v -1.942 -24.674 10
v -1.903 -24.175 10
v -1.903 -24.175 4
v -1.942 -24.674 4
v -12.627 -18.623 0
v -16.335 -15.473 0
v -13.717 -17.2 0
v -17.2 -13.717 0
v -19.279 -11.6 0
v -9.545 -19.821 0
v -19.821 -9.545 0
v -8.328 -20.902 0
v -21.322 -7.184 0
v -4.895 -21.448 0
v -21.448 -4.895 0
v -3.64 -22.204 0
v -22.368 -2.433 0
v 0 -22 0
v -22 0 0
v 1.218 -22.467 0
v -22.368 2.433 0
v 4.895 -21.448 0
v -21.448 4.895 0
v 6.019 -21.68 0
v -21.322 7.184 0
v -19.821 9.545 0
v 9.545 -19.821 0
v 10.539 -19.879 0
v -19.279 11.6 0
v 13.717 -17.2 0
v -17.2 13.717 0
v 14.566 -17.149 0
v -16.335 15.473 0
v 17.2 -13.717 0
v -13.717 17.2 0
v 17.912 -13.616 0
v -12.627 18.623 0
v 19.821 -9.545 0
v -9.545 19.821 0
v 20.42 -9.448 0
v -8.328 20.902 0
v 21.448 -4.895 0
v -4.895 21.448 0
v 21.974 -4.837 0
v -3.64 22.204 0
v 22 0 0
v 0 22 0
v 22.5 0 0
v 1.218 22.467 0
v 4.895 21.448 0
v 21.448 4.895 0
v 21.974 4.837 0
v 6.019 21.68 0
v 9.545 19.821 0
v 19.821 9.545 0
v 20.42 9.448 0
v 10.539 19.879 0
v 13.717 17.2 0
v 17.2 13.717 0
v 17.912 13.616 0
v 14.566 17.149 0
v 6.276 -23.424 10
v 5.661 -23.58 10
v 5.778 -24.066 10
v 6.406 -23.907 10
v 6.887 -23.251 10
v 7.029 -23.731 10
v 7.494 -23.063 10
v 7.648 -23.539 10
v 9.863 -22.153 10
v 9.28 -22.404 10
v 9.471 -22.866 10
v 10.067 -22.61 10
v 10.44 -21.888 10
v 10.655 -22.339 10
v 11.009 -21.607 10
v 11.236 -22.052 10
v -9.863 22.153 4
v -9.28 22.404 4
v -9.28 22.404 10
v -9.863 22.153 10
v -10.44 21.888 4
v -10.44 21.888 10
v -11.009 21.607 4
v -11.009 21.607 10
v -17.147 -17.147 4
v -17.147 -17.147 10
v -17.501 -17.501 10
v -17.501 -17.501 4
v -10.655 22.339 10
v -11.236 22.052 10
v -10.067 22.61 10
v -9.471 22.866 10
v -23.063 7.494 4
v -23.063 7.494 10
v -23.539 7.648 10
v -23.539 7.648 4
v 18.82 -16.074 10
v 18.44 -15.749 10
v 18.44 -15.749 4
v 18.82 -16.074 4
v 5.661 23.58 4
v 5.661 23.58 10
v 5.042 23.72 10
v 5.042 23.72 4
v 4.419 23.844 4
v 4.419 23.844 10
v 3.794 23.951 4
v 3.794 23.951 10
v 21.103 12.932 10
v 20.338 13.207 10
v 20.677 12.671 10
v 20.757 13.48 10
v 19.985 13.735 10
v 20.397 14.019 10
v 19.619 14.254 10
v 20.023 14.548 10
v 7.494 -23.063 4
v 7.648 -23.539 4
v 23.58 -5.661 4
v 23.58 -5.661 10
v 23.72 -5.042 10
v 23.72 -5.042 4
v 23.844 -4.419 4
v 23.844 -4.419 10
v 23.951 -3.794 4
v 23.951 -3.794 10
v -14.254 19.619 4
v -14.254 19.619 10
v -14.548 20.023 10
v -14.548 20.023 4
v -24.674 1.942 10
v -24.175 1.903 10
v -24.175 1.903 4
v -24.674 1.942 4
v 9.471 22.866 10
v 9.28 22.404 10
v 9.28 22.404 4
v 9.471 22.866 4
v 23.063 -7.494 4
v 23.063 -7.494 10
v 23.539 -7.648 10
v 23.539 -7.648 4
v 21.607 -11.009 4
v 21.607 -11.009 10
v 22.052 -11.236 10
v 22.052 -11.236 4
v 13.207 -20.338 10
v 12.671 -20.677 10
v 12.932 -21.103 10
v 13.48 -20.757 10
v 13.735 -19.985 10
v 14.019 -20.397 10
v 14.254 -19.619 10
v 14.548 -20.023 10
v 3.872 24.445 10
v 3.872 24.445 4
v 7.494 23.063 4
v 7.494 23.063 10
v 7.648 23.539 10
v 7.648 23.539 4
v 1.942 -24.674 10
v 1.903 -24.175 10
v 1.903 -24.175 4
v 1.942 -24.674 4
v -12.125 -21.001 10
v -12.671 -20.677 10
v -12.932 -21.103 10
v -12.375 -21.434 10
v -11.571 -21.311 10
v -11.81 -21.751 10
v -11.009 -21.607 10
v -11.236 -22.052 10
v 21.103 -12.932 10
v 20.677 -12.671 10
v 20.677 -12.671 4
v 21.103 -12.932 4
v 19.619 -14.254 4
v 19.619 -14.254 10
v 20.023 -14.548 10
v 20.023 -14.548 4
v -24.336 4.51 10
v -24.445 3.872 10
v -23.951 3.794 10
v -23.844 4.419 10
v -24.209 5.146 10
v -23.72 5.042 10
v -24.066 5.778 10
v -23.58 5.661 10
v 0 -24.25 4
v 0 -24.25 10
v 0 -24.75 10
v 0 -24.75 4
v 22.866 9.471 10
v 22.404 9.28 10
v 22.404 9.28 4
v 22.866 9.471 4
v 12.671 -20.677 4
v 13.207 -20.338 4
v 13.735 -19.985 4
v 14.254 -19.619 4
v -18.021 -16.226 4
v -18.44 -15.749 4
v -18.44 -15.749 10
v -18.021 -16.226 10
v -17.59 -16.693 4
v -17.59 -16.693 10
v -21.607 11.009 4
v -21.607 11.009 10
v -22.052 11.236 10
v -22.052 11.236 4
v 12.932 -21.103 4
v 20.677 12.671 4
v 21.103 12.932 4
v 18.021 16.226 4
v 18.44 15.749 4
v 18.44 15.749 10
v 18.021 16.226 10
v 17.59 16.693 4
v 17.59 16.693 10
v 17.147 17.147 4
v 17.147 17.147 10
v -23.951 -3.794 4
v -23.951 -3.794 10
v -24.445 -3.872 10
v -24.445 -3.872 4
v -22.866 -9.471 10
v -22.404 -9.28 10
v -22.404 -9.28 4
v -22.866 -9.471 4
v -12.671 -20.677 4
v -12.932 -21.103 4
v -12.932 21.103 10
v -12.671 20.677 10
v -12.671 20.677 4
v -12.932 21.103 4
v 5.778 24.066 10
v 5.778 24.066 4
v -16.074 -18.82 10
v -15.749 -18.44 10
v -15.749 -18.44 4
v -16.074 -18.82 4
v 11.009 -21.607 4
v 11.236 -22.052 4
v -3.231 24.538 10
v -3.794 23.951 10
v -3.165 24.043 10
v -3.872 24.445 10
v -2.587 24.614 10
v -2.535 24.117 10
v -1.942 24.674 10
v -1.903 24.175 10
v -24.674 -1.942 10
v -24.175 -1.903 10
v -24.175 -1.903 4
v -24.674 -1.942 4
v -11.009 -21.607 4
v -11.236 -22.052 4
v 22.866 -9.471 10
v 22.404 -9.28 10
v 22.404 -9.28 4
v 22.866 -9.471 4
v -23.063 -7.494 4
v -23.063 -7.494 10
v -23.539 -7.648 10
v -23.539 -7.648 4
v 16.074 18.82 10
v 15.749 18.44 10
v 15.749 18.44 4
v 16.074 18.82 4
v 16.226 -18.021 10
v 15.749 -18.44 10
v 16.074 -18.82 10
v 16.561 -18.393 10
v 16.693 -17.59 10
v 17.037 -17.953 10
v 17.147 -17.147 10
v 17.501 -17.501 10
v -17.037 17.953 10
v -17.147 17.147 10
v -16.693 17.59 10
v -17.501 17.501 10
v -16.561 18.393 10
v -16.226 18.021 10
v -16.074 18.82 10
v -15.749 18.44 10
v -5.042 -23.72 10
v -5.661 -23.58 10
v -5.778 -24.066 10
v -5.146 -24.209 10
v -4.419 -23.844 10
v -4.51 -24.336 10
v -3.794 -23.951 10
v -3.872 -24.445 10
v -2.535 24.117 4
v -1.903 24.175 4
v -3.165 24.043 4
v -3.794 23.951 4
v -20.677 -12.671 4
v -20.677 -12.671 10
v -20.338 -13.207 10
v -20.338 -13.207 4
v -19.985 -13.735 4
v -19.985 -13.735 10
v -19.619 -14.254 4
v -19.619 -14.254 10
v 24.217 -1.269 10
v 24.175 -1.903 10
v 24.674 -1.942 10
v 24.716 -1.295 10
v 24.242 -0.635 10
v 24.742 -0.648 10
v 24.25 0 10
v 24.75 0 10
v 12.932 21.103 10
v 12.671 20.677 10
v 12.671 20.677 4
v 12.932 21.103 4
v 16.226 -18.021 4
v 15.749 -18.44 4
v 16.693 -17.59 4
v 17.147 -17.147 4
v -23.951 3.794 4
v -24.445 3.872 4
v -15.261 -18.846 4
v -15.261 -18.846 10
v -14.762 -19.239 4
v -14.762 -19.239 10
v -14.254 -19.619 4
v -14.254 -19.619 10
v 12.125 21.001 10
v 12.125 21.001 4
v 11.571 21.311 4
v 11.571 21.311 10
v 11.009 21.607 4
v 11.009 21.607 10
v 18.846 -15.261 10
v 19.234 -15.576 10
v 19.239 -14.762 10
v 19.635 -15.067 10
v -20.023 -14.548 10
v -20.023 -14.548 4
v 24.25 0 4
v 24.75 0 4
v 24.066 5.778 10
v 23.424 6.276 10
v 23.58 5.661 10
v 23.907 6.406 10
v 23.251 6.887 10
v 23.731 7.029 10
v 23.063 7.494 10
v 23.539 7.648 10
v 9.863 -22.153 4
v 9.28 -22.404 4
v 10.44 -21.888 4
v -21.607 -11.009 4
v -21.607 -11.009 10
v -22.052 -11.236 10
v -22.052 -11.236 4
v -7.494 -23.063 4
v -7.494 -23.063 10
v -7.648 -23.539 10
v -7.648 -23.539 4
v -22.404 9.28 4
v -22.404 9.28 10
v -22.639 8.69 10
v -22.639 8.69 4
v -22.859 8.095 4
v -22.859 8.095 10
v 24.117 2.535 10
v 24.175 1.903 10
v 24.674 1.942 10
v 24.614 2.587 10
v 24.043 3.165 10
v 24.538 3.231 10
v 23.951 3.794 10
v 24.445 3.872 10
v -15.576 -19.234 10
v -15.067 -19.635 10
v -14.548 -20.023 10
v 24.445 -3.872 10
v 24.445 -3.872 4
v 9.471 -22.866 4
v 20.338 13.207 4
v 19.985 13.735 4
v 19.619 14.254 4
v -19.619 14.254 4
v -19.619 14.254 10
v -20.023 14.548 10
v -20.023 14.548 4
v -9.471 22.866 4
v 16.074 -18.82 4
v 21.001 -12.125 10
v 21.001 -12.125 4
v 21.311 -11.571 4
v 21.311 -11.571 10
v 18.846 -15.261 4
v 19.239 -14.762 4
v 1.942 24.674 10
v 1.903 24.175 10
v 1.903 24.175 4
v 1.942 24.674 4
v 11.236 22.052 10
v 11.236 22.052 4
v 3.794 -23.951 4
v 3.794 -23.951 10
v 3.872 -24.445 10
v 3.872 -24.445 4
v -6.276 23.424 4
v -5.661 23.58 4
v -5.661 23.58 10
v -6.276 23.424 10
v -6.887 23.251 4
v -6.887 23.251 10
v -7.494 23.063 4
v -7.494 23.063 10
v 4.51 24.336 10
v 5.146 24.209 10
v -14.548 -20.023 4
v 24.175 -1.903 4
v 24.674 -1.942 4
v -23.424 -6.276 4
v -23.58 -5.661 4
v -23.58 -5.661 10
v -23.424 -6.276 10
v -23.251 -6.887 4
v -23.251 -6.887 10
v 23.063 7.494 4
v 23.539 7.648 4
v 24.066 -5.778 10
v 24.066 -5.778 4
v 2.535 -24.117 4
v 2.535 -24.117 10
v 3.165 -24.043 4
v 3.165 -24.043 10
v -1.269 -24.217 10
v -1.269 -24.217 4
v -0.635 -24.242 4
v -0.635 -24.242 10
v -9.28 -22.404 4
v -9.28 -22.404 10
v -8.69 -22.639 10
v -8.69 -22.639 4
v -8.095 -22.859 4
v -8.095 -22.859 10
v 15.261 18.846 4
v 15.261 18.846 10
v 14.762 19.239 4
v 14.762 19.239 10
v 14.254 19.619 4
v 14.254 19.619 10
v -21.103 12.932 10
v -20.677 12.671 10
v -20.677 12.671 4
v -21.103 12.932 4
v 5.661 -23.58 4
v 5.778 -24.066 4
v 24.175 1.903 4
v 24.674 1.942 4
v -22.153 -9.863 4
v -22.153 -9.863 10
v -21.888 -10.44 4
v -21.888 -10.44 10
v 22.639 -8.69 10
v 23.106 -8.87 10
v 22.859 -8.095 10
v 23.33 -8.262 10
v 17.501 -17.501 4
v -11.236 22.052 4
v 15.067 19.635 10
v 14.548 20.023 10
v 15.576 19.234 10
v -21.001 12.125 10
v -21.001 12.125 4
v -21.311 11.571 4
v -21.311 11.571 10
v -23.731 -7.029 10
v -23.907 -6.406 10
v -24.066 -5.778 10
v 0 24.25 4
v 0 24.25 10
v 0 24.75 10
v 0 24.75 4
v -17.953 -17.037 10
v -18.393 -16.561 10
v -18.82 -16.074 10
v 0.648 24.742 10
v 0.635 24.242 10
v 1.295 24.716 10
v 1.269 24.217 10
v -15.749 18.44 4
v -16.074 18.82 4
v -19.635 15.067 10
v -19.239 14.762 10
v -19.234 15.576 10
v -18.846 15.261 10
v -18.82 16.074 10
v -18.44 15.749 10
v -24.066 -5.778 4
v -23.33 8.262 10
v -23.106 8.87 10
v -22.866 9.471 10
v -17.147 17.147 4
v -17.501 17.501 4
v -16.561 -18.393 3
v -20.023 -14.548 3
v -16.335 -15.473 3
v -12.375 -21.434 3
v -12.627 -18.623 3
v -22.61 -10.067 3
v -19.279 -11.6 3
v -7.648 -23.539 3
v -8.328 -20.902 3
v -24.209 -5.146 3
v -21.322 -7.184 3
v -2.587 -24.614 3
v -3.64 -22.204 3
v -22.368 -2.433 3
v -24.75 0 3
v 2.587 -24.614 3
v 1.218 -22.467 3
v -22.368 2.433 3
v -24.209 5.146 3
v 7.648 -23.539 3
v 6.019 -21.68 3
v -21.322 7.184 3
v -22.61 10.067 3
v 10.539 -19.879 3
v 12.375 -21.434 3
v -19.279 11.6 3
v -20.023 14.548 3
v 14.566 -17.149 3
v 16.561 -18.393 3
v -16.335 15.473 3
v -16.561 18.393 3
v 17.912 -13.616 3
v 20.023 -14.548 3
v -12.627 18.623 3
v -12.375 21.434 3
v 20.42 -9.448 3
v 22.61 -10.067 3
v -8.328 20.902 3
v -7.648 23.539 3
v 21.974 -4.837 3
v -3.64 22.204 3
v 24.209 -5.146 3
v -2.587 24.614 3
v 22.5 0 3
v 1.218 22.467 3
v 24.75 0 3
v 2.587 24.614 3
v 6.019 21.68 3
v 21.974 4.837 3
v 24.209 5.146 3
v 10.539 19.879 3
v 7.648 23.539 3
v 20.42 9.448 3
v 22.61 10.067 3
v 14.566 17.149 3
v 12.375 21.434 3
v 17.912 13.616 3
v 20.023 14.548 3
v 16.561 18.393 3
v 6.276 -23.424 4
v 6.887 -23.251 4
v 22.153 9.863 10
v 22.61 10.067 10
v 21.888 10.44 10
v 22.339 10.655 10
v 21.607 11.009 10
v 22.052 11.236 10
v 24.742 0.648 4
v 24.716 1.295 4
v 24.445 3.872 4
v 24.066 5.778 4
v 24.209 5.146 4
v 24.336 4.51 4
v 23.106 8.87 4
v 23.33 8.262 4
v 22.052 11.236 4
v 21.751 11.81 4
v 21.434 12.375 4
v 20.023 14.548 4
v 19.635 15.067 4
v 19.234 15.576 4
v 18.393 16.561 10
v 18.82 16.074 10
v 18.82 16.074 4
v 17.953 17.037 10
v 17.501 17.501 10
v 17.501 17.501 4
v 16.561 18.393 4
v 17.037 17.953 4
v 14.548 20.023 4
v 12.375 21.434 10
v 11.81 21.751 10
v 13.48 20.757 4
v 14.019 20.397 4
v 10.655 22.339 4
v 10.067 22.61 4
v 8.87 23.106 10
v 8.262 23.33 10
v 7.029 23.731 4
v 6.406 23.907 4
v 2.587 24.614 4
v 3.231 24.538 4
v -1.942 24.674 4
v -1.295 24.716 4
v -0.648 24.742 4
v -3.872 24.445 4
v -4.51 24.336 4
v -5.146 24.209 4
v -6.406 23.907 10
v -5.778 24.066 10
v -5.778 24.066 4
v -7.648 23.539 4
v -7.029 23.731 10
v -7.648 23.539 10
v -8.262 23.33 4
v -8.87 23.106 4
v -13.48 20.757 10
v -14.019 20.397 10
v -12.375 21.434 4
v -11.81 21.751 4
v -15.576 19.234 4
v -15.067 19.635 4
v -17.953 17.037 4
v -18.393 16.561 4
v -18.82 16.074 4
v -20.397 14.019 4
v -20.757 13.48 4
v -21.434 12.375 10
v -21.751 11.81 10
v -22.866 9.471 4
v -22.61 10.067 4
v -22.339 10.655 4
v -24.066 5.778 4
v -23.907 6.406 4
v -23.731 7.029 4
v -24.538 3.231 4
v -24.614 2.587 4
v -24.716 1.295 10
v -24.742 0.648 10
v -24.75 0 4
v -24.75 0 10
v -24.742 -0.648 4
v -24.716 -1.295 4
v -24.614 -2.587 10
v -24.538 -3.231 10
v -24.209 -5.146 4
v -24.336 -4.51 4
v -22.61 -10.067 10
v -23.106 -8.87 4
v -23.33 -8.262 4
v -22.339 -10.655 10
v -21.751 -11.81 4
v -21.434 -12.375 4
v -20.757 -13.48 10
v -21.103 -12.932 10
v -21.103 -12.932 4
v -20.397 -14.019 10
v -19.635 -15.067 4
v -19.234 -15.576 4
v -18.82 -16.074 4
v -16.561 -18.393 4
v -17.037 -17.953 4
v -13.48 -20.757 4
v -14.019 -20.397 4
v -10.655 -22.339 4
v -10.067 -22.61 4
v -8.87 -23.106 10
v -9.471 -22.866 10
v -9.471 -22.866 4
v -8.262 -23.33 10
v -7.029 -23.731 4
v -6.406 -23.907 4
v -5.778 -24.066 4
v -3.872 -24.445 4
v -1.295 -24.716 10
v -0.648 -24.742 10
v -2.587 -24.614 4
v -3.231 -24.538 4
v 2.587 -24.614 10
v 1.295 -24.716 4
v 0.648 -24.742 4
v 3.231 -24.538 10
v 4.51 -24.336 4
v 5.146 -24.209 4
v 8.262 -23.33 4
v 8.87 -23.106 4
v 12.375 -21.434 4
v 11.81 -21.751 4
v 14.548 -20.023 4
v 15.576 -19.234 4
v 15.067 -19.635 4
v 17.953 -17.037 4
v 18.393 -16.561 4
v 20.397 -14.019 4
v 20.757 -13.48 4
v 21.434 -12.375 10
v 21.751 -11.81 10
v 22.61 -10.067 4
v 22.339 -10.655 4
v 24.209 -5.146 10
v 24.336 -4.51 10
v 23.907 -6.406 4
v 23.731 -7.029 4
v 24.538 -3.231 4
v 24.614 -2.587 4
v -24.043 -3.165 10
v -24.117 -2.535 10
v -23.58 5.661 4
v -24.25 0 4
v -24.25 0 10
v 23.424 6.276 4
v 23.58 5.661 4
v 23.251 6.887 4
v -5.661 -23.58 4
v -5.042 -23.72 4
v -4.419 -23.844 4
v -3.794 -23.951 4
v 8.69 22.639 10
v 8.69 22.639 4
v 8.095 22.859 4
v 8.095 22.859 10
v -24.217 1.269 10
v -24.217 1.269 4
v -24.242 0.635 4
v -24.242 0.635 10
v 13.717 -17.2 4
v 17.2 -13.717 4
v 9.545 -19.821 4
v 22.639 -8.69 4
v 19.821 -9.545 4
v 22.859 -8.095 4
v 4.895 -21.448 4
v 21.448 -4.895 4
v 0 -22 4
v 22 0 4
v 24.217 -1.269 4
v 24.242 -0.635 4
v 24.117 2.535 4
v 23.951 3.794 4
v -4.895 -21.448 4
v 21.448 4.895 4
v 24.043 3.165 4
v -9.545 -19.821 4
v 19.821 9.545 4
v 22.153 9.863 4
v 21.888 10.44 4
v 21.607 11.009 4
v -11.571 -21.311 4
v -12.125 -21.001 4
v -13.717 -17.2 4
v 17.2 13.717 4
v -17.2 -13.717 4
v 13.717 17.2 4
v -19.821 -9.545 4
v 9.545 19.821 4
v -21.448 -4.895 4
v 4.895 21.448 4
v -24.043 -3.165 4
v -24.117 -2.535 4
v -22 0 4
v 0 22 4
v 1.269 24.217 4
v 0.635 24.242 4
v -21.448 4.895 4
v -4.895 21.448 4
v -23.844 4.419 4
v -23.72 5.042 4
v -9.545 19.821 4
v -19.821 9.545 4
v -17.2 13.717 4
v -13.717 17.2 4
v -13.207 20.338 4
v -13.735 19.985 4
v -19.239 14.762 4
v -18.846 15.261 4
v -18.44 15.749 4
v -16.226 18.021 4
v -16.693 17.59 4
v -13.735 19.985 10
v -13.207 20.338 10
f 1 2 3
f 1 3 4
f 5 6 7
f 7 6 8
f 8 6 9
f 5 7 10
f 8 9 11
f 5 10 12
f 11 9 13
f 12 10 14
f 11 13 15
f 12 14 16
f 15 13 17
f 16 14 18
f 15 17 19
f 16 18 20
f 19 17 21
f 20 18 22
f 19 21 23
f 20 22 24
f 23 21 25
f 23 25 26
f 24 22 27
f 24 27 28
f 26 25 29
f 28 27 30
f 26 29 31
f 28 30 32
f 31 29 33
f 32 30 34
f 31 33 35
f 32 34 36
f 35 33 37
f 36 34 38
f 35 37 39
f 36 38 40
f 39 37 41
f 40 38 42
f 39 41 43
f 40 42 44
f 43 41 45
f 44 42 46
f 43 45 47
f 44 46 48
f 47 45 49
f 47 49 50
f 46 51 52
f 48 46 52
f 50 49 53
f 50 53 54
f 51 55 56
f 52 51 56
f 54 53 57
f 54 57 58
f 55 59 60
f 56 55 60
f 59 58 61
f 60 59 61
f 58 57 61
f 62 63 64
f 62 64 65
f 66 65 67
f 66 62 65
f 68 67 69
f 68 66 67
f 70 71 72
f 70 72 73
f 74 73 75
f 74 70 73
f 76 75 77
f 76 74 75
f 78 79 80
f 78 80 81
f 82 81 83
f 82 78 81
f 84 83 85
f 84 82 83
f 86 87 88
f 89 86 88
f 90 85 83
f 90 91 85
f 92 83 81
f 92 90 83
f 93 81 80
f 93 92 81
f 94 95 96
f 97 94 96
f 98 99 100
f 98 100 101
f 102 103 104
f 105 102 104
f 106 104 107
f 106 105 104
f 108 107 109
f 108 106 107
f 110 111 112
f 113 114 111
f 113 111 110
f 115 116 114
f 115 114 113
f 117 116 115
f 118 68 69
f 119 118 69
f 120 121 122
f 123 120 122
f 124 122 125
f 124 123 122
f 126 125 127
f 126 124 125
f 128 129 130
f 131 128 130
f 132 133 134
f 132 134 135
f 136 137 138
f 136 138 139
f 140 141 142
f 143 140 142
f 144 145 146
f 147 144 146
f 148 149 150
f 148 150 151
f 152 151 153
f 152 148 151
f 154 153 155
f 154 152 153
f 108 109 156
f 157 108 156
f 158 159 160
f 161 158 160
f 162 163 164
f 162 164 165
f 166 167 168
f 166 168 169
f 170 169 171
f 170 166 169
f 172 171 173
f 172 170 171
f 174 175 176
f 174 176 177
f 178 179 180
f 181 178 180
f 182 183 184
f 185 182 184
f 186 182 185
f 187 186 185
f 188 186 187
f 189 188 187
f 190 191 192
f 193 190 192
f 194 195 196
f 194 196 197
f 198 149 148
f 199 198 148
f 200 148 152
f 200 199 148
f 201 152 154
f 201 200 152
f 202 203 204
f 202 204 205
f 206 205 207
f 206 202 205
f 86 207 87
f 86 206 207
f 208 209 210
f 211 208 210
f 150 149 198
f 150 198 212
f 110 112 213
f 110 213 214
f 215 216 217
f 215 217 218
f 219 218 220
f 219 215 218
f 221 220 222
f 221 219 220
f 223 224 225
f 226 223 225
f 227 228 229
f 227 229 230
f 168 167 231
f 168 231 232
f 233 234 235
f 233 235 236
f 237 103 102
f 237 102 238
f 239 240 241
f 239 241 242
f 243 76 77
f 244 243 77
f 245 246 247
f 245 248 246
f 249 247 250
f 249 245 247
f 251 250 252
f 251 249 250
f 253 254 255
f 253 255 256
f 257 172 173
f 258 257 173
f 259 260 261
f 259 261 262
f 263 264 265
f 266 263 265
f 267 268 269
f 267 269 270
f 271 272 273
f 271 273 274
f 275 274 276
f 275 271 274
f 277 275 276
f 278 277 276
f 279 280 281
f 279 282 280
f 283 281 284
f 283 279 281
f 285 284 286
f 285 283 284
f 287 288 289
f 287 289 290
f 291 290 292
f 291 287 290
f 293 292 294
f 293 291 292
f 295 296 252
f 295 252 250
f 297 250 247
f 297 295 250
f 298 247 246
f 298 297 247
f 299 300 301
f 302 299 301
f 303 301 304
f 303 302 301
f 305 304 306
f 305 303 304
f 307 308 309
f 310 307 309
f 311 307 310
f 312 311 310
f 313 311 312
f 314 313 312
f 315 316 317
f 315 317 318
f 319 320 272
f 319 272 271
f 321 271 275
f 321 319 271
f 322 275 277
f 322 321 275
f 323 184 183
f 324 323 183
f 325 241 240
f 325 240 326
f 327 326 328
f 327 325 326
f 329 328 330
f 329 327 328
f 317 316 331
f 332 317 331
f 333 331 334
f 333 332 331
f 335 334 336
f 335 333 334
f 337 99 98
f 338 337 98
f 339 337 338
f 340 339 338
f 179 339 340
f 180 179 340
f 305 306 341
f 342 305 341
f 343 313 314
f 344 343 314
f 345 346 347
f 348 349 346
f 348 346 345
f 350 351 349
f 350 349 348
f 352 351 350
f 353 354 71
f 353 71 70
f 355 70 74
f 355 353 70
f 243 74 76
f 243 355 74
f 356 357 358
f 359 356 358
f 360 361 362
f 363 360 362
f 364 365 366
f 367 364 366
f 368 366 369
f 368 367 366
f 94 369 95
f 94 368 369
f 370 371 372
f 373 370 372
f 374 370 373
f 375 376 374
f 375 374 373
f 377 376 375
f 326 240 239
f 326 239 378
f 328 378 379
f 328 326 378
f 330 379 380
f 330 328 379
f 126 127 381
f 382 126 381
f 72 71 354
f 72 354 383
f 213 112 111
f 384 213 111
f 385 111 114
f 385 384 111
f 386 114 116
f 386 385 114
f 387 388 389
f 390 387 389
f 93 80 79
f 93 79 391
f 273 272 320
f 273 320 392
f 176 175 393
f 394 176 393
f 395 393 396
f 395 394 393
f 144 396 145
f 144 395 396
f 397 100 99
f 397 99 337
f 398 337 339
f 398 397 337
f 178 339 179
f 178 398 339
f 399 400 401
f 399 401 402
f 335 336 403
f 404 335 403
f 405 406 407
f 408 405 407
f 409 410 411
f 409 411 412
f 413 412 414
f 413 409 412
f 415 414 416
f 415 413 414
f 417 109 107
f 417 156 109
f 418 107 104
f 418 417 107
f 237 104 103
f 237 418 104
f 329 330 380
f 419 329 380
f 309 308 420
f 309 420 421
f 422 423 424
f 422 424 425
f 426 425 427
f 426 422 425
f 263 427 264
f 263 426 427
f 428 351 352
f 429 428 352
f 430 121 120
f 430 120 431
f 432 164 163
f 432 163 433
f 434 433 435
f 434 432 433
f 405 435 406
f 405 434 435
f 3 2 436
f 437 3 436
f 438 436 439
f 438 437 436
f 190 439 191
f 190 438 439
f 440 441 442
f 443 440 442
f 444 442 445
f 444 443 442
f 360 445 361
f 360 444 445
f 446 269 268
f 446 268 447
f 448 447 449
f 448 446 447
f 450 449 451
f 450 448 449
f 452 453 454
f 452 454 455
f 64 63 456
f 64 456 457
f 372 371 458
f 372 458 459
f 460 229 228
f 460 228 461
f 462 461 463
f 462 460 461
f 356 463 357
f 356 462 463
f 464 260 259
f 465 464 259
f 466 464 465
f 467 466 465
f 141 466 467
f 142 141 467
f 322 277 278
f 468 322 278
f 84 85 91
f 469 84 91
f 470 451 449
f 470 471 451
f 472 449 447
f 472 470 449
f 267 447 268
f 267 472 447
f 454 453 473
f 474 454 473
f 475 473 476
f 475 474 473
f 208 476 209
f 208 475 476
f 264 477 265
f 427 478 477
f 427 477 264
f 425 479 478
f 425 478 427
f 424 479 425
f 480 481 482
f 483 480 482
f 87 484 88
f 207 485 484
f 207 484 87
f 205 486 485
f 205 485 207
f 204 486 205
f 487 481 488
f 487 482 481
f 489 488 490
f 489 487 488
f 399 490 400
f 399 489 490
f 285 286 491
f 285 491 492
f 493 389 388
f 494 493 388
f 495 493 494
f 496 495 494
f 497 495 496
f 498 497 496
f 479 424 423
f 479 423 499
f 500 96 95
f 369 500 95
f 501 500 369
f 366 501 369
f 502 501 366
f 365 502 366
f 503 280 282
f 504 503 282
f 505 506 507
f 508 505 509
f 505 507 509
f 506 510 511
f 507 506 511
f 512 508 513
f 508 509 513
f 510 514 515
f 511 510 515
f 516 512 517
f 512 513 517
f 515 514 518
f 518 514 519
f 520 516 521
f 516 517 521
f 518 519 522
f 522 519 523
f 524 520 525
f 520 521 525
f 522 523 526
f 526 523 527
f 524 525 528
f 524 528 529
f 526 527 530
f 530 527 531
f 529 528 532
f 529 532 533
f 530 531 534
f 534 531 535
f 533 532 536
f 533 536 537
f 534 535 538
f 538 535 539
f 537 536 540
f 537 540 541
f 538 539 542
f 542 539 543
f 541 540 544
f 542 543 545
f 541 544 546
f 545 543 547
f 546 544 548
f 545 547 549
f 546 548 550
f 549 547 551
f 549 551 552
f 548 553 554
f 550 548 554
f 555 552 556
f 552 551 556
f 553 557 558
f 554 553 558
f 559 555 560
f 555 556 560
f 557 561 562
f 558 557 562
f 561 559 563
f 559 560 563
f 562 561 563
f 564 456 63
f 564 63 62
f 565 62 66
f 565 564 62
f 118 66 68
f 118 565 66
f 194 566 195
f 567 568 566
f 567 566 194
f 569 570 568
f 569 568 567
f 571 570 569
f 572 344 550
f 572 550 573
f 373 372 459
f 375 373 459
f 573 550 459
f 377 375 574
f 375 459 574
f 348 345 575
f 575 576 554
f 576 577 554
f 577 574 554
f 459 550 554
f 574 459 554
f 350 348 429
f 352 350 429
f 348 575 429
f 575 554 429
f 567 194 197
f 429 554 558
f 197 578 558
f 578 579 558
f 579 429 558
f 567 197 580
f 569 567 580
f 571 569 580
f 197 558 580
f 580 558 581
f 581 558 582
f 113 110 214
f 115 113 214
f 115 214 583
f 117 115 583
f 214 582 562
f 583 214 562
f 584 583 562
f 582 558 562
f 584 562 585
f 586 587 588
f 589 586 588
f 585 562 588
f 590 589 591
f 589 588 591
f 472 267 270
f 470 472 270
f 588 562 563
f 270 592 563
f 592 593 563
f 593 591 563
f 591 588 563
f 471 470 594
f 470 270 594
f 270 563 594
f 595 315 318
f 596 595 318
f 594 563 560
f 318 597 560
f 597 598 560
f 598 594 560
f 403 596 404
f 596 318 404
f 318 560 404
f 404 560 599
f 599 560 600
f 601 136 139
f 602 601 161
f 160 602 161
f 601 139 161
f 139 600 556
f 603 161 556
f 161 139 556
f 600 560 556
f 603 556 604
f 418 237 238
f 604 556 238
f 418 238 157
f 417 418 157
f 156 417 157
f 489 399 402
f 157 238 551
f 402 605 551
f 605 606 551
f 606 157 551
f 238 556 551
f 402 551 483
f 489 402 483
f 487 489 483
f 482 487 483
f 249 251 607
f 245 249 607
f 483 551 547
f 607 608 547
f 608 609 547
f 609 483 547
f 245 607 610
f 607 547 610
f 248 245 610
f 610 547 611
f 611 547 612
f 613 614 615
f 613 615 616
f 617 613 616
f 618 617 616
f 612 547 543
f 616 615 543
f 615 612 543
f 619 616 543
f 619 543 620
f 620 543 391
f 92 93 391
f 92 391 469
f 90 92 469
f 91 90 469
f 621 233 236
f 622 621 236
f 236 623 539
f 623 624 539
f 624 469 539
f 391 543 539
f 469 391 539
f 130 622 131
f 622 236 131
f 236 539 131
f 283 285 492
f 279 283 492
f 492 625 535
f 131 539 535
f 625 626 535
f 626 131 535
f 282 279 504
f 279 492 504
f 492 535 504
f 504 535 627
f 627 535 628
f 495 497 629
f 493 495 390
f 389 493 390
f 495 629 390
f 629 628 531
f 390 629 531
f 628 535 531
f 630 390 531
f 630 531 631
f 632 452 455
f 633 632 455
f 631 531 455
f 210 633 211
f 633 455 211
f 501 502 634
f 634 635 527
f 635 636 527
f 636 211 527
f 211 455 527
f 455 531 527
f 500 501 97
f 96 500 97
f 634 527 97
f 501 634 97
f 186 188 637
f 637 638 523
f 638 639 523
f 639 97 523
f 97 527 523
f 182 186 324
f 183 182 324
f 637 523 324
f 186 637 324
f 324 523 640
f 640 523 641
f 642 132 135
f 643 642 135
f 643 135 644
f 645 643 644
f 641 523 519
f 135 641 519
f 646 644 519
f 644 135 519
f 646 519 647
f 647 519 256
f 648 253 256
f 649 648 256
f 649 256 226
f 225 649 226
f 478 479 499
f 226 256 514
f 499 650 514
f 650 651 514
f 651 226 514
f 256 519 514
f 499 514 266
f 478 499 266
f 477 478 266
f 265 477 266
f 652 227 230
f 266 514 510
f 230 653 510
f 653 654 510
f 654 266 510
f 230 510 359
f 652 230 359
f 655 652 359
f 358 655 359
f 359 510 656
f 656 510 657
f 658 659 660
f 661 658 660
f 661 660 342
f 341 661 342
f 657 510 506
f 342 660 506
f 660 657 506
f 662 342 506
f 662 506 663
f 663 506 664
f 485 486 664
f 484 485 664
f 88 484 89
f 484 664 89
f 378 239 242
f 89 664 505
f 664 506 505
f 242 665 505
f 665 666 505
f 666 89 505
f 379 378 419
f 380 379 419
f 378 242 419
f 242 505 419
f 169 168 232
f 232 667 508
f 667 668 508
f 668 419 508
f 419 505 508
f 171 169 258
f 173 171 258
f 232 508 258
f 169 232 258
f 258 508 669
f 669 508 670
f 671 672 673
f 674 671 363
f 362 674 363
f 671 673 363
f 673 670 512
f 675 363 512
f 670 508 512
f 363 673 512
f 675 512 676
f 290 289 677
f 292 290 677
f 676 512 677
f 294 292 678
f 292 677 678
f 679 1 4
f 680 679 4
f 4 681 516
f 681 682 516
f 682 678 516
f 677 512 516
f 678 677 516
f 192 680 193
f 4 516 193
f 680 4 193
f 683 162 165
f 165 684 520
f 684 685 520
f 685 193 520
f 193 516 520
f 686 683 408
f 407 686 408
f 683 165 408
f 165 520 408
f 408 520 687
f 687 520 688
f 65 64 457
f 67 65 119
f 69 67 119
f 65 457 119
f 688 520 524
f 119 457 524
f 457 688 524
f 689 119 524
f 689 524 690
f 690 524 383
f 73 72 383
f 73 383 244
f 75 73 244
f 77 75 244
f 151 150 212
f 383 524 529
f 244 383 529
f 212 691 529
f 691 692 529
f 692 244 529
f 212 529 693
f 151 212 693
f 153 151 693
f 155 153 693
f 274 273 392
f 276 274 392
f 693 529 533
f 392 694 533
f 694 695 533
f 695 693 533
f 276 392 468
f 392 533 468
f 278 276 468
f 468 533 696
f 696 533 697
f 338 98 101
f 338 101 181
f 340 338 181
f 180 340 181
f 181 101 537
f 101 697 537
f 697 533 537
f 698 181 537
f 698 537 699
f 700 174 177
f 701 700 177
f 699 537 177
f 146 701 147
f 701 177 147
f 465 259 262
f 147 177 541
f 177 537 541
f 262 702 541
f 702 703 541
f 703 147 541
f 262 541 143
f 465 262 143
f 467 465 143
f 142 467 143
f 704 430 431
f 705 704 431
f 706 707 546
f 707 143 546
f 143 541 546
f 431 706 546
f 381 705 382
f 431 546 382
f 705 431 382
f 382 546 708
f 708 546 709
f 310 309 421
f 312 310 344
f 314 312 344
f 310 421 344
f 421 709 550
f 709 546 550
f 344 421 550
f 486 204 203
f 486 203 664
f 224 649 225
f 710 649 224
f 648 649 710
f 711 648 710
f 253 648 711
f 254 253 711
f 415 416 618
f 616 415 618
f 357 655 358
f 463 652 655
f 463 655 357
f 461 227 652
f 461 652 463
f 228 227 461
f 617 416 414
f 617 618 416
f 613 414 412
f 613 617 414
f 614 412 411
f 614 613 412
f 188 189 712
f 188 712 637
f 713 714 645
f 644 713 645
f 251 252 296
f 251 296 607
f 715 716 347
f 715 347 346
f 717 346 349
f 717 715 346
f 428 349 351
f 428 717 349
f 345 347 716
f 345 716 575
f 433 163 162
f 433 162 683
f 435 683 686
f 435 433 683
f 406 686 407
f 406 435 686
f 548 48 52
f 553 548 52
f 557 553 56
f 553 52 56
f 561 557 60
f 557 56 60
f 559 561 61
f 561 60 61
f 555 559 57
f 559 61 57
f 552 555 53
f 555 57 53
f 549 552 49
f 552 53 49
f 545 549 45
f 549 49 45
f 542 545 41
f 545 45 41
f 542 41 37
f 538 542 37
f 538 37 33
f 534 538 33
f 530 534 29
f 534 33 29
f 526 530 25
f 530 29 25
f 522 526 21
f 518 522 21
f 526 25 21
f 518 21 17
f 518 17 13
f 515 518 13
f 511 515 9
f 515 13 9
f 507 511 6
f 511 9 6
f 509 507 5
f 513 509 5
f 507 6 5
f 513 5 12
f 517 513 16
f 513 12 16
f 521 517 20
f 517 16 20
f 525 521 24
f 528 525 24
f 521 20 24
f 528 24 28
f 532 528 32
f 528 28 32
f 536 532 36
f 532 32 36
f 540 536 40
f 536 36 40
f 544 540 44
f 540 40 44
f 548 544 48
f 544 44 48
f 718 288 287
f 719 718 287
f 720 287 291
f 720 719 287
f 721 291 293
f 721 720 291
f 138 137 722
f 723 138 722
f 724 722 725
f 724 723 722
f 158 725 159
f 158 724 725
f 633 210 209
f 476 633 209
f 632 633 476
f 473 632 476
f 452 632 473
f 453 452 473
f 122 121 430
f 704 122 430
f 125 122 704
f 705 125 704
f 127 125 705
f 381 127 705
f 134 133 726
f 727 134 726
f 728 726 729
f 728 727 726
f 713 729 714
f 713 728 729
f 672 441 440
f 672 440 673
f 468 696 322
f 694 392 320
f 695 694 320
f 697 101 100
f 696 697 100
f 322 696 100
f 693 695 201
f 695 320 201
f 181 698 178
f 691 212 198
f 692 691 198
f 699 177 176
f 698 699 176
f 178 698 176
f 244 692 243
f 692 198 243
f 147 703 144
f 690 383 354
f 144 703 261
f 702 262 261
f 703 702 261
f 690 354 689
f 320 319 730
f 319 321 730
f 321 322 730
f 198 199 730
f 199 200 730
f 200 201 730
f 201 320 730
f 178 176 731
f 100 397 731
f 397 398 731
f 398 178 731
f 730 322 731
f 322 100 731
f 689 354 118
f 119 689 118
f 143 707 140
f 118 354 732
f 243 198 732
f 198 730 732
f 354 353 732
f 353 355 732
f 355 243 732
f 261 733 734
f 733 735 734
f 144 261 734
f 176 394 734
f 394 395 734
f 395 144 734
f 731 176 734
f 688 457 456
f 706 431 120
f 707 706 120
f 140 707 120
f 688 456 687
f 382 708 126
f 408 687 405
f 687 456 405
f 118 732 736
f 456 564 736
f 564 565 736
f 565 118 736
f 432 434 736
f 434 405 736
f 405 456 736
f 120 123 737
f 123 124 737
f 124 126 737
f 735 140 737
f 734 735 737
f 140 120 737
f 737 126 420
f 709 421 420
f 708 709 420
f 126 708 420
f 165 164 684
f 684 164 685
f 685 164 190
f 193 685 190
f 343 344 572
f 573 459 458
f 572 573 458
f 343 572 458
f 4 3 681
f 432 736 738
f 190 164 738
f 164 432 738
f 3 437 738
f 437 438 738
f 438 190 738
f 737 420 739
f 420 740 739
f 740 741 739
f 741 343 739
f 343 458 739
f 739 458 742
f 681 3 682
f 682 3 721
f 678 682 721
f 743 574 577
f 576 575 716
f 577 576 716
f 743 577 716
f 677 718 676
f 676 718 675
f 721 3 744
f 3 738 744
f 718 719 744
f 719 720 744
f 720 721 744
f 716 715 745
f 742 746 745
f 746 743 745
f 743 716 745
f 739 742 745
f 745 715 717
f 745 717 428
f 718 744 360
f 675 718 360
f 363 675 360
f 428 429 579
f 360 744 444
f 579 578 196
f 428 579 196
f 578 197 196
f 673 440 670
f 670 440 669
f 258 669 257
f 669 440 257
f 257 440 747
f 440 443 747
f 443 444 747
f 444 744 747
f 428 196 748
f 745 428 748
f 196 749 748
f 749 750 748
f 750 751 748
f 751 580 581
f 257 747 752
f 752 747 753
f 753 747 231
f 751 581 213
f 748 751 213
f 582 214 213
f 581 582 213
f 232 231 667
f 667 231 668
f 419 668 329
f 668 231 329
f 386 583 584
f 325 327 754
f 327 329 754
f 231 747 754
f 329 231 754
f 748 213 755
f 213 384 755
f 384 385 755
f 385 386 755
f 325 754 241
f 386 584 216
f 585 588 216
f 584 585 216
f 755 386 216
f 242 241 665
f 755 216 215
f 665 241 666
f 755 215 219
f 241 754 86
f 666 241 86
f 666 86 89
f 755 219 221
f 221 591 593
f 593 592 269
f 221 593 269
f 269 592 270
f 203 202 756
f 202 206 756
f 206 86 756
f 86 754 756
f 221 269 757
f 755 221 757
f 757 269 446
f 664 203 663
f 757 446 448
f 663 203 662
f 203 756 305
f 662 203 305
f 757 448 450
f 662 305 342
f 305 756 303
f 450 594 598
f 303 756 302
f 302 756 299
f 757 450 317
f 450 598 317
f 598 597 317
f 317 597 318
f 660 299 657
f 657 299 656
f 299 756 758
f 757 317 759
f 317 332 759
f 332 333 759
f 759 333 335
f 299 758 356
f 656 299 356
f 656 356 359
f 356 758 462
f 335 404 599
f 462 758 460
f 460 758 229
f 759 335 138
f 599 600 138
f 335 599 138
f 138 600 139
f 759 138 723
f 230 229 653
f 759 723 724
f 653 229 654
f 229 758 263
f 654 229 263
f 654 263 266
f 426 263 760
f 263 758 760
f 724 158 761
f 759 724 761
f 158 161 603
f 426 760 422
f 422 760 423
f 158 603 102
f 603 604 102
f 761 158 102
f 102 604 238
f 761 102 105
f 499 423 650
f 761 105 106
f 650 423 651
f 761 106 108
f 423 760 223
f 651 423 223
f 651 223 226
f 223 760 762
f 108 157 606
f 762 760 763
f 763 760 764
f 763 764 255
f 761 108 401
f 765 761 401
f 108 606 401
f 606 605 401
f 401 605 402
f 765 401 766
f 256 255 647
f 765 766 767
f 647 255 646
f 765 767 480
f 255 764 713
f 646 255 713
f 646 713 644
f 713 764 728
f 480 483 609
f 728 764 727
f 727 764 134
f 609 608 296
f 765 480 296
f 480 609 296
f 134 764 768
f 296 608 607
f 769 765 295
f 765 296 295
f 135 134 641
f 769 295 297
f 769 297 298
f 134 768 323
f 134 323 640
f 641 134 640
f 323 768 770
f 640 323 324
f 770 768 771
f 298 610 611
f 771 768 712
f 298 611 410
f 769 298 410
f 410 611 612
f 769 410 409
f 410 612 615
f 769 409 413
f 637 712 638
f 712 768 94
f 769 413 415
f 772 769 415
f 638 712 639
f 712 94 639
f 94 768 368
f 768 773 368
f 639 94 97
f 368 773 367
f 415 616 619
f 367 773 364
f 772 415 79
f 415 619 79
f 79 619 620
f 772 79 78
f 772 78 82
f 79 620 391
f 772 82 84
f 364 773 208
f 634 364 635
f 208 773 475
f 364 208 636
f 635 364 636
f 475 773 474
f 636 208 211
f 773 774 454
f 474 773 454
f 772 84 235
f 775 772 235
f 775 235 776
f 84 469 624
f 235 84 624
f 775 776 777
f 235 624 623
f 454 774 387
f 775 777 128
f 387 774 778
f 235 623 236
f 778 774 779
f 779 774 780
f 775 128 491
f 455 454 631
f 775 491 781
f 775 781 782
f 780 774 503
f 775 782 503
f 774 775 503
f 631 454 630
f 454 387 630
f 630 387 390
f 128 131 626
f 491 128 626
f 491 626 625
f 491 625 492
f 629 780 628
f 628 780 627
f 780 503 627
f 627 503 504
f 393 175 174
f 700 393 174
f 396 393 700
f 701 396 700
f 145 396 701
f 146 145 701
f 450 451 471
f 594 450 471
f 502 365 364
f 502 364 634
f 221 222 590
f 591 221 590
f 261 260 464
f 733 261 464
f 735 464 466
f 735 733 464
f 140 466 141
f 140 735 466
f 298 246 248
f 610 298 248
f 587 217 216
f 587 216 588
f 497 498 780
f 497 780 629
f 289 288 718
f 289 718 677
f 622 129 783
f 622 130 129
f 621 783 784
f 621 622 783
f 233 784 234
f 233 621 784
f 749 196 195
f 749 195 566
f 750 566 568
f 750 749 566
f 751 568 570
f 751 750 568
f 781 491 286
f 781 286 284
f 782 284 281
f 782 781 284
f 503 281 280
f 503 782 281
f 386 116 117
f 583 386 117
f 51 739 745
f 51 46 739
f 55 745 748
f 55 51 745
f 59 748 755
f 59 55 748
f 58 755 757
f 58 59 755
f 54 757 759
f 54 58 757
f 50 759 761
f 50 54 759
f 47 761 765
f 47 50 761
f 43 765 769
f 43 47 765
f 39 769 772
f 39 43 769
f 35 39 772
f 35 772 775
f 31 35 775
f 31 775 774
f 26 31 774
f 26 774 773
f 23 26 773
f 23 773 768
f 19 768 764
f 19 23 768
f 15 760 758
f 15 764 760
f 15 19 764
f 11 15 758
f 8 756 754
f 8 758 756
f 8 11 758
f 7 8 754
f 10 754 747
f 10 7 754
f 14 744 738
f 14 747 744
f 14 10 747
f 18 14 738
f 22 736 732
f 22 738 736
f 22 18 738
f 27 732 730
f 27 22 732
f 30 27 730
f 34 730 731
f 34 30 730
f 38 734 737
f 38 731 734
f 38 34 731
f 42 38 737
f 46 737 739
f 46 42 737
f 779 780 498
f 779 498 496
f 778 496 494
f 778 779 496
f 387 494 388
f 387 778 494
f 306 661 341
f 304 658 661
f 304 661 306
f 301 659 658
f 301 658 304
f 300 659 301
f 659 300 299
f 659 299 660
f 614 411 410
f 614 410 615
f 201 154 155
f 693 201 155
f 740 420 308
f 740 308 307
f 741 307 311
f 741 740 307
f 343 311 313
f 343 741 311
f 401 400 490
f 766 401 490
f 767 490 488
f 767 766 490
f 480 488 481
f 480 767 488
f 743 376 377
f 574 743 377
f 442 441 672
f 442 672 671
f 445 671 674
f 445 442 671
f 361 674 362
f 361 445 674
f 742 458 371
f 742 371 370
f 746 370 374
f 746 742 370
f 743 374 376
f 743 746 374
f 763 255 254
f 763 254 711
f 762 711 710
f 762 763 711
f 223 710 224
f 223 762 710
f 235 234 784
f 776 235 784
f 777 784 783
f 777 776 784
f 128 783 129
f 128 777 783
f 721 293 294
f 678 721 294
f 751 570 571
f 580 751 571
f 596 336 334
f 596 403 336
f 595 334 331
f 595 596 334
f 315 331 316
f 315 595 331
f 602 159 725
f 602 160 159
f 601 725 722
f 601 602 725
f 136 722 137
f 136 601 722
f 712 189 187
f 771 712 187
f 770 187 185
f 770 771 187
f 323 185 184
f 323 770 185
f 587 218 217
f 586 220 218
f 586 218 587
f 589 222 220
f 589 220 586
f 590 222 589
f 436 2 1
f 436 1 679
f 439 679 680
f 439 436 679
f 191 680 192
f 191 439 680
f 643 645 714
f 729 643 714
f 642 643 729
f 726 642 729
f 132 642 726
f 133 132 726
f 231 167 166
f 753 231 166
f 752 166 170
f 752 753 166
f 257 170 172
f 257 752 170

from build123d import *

# Parameters (mm, degrees)
SKETCH_R           = 22.5
SKETCH_R_2         = 22
PAD_DEPTH          = 3
SKETCH001_R        = 24.75
SKETCH001_R_2      = 22
PAD001_DEPTH       = 1
SKETCH002_R        = 24.75
SKETCH002_R_2      = 24.25
PAD002_DEPTH       = 6
POCKET_DEPTH       = 6
POLARPATTERN_COUNT = 40


with BuildPart() as part:
    # Sketch → Pad (new body)
    with BuildSketch(Plane.XY):
        Circle(SKETCH_R)
        Circle(SKETCH_R_2, mode=Mode.SUBTRACT)
    extrude(amount=PAD_DEPTH)

    # Sketch001 (on Face4 of Pad) → Pad001 (join)
    with BuildSketch(Plane.XY.offset(3)):
        Circle(SKETCH001_R)
        Circle(SKETCH001_R_2, mode=Mode.SUBTRACT)
    extrude(amount=PAD001_DEPTH)

    # Sketch002 (on Face5 of Pad001) → Pad002 (join)
    with BuildSketch(Plane.XY.offset(4)):
        Circle(SKETCH002_R)
        Circle(SKETCH002_R_2, mode=Mode.SUBTRACT)
    extrude(amount=PAD002_DEPTH)

    # Sketch003 (on Face7 of Pad002) → Pocket (cut)
    with BuildSketch(Plane.XY.offset(10)):
        with BuildLine():
            ThreePointArc((20.687132, 0), (20.671183, 0.812175), (20.62336, 1.623097))
            Line((20.62336, 1.623097), (25.593958, 2.014293))
            ThreePointArc((25.6731, 0), (25.653307, 1.007924), (25.593958, 2.014293))
            Line((20.687132, 0), (25.6731, 0))
        make_face()
    pocket = extrude(amount=-POCKET_DEPTH, mode=Mode.SUBTRACT)

    # PolarPattern: Pocket ×40 about axis
    polarpattern_axis = Axis((0, 0, 10), (0, 0, 1))
    for i in range(1, POLARPATTERN_COUNT):
        add(pocket.rotate(polarpattern_axis, i * 360 / POLARPATTERN_COUNT), mode=Mode.SUBTRACT)


solid = part.part
